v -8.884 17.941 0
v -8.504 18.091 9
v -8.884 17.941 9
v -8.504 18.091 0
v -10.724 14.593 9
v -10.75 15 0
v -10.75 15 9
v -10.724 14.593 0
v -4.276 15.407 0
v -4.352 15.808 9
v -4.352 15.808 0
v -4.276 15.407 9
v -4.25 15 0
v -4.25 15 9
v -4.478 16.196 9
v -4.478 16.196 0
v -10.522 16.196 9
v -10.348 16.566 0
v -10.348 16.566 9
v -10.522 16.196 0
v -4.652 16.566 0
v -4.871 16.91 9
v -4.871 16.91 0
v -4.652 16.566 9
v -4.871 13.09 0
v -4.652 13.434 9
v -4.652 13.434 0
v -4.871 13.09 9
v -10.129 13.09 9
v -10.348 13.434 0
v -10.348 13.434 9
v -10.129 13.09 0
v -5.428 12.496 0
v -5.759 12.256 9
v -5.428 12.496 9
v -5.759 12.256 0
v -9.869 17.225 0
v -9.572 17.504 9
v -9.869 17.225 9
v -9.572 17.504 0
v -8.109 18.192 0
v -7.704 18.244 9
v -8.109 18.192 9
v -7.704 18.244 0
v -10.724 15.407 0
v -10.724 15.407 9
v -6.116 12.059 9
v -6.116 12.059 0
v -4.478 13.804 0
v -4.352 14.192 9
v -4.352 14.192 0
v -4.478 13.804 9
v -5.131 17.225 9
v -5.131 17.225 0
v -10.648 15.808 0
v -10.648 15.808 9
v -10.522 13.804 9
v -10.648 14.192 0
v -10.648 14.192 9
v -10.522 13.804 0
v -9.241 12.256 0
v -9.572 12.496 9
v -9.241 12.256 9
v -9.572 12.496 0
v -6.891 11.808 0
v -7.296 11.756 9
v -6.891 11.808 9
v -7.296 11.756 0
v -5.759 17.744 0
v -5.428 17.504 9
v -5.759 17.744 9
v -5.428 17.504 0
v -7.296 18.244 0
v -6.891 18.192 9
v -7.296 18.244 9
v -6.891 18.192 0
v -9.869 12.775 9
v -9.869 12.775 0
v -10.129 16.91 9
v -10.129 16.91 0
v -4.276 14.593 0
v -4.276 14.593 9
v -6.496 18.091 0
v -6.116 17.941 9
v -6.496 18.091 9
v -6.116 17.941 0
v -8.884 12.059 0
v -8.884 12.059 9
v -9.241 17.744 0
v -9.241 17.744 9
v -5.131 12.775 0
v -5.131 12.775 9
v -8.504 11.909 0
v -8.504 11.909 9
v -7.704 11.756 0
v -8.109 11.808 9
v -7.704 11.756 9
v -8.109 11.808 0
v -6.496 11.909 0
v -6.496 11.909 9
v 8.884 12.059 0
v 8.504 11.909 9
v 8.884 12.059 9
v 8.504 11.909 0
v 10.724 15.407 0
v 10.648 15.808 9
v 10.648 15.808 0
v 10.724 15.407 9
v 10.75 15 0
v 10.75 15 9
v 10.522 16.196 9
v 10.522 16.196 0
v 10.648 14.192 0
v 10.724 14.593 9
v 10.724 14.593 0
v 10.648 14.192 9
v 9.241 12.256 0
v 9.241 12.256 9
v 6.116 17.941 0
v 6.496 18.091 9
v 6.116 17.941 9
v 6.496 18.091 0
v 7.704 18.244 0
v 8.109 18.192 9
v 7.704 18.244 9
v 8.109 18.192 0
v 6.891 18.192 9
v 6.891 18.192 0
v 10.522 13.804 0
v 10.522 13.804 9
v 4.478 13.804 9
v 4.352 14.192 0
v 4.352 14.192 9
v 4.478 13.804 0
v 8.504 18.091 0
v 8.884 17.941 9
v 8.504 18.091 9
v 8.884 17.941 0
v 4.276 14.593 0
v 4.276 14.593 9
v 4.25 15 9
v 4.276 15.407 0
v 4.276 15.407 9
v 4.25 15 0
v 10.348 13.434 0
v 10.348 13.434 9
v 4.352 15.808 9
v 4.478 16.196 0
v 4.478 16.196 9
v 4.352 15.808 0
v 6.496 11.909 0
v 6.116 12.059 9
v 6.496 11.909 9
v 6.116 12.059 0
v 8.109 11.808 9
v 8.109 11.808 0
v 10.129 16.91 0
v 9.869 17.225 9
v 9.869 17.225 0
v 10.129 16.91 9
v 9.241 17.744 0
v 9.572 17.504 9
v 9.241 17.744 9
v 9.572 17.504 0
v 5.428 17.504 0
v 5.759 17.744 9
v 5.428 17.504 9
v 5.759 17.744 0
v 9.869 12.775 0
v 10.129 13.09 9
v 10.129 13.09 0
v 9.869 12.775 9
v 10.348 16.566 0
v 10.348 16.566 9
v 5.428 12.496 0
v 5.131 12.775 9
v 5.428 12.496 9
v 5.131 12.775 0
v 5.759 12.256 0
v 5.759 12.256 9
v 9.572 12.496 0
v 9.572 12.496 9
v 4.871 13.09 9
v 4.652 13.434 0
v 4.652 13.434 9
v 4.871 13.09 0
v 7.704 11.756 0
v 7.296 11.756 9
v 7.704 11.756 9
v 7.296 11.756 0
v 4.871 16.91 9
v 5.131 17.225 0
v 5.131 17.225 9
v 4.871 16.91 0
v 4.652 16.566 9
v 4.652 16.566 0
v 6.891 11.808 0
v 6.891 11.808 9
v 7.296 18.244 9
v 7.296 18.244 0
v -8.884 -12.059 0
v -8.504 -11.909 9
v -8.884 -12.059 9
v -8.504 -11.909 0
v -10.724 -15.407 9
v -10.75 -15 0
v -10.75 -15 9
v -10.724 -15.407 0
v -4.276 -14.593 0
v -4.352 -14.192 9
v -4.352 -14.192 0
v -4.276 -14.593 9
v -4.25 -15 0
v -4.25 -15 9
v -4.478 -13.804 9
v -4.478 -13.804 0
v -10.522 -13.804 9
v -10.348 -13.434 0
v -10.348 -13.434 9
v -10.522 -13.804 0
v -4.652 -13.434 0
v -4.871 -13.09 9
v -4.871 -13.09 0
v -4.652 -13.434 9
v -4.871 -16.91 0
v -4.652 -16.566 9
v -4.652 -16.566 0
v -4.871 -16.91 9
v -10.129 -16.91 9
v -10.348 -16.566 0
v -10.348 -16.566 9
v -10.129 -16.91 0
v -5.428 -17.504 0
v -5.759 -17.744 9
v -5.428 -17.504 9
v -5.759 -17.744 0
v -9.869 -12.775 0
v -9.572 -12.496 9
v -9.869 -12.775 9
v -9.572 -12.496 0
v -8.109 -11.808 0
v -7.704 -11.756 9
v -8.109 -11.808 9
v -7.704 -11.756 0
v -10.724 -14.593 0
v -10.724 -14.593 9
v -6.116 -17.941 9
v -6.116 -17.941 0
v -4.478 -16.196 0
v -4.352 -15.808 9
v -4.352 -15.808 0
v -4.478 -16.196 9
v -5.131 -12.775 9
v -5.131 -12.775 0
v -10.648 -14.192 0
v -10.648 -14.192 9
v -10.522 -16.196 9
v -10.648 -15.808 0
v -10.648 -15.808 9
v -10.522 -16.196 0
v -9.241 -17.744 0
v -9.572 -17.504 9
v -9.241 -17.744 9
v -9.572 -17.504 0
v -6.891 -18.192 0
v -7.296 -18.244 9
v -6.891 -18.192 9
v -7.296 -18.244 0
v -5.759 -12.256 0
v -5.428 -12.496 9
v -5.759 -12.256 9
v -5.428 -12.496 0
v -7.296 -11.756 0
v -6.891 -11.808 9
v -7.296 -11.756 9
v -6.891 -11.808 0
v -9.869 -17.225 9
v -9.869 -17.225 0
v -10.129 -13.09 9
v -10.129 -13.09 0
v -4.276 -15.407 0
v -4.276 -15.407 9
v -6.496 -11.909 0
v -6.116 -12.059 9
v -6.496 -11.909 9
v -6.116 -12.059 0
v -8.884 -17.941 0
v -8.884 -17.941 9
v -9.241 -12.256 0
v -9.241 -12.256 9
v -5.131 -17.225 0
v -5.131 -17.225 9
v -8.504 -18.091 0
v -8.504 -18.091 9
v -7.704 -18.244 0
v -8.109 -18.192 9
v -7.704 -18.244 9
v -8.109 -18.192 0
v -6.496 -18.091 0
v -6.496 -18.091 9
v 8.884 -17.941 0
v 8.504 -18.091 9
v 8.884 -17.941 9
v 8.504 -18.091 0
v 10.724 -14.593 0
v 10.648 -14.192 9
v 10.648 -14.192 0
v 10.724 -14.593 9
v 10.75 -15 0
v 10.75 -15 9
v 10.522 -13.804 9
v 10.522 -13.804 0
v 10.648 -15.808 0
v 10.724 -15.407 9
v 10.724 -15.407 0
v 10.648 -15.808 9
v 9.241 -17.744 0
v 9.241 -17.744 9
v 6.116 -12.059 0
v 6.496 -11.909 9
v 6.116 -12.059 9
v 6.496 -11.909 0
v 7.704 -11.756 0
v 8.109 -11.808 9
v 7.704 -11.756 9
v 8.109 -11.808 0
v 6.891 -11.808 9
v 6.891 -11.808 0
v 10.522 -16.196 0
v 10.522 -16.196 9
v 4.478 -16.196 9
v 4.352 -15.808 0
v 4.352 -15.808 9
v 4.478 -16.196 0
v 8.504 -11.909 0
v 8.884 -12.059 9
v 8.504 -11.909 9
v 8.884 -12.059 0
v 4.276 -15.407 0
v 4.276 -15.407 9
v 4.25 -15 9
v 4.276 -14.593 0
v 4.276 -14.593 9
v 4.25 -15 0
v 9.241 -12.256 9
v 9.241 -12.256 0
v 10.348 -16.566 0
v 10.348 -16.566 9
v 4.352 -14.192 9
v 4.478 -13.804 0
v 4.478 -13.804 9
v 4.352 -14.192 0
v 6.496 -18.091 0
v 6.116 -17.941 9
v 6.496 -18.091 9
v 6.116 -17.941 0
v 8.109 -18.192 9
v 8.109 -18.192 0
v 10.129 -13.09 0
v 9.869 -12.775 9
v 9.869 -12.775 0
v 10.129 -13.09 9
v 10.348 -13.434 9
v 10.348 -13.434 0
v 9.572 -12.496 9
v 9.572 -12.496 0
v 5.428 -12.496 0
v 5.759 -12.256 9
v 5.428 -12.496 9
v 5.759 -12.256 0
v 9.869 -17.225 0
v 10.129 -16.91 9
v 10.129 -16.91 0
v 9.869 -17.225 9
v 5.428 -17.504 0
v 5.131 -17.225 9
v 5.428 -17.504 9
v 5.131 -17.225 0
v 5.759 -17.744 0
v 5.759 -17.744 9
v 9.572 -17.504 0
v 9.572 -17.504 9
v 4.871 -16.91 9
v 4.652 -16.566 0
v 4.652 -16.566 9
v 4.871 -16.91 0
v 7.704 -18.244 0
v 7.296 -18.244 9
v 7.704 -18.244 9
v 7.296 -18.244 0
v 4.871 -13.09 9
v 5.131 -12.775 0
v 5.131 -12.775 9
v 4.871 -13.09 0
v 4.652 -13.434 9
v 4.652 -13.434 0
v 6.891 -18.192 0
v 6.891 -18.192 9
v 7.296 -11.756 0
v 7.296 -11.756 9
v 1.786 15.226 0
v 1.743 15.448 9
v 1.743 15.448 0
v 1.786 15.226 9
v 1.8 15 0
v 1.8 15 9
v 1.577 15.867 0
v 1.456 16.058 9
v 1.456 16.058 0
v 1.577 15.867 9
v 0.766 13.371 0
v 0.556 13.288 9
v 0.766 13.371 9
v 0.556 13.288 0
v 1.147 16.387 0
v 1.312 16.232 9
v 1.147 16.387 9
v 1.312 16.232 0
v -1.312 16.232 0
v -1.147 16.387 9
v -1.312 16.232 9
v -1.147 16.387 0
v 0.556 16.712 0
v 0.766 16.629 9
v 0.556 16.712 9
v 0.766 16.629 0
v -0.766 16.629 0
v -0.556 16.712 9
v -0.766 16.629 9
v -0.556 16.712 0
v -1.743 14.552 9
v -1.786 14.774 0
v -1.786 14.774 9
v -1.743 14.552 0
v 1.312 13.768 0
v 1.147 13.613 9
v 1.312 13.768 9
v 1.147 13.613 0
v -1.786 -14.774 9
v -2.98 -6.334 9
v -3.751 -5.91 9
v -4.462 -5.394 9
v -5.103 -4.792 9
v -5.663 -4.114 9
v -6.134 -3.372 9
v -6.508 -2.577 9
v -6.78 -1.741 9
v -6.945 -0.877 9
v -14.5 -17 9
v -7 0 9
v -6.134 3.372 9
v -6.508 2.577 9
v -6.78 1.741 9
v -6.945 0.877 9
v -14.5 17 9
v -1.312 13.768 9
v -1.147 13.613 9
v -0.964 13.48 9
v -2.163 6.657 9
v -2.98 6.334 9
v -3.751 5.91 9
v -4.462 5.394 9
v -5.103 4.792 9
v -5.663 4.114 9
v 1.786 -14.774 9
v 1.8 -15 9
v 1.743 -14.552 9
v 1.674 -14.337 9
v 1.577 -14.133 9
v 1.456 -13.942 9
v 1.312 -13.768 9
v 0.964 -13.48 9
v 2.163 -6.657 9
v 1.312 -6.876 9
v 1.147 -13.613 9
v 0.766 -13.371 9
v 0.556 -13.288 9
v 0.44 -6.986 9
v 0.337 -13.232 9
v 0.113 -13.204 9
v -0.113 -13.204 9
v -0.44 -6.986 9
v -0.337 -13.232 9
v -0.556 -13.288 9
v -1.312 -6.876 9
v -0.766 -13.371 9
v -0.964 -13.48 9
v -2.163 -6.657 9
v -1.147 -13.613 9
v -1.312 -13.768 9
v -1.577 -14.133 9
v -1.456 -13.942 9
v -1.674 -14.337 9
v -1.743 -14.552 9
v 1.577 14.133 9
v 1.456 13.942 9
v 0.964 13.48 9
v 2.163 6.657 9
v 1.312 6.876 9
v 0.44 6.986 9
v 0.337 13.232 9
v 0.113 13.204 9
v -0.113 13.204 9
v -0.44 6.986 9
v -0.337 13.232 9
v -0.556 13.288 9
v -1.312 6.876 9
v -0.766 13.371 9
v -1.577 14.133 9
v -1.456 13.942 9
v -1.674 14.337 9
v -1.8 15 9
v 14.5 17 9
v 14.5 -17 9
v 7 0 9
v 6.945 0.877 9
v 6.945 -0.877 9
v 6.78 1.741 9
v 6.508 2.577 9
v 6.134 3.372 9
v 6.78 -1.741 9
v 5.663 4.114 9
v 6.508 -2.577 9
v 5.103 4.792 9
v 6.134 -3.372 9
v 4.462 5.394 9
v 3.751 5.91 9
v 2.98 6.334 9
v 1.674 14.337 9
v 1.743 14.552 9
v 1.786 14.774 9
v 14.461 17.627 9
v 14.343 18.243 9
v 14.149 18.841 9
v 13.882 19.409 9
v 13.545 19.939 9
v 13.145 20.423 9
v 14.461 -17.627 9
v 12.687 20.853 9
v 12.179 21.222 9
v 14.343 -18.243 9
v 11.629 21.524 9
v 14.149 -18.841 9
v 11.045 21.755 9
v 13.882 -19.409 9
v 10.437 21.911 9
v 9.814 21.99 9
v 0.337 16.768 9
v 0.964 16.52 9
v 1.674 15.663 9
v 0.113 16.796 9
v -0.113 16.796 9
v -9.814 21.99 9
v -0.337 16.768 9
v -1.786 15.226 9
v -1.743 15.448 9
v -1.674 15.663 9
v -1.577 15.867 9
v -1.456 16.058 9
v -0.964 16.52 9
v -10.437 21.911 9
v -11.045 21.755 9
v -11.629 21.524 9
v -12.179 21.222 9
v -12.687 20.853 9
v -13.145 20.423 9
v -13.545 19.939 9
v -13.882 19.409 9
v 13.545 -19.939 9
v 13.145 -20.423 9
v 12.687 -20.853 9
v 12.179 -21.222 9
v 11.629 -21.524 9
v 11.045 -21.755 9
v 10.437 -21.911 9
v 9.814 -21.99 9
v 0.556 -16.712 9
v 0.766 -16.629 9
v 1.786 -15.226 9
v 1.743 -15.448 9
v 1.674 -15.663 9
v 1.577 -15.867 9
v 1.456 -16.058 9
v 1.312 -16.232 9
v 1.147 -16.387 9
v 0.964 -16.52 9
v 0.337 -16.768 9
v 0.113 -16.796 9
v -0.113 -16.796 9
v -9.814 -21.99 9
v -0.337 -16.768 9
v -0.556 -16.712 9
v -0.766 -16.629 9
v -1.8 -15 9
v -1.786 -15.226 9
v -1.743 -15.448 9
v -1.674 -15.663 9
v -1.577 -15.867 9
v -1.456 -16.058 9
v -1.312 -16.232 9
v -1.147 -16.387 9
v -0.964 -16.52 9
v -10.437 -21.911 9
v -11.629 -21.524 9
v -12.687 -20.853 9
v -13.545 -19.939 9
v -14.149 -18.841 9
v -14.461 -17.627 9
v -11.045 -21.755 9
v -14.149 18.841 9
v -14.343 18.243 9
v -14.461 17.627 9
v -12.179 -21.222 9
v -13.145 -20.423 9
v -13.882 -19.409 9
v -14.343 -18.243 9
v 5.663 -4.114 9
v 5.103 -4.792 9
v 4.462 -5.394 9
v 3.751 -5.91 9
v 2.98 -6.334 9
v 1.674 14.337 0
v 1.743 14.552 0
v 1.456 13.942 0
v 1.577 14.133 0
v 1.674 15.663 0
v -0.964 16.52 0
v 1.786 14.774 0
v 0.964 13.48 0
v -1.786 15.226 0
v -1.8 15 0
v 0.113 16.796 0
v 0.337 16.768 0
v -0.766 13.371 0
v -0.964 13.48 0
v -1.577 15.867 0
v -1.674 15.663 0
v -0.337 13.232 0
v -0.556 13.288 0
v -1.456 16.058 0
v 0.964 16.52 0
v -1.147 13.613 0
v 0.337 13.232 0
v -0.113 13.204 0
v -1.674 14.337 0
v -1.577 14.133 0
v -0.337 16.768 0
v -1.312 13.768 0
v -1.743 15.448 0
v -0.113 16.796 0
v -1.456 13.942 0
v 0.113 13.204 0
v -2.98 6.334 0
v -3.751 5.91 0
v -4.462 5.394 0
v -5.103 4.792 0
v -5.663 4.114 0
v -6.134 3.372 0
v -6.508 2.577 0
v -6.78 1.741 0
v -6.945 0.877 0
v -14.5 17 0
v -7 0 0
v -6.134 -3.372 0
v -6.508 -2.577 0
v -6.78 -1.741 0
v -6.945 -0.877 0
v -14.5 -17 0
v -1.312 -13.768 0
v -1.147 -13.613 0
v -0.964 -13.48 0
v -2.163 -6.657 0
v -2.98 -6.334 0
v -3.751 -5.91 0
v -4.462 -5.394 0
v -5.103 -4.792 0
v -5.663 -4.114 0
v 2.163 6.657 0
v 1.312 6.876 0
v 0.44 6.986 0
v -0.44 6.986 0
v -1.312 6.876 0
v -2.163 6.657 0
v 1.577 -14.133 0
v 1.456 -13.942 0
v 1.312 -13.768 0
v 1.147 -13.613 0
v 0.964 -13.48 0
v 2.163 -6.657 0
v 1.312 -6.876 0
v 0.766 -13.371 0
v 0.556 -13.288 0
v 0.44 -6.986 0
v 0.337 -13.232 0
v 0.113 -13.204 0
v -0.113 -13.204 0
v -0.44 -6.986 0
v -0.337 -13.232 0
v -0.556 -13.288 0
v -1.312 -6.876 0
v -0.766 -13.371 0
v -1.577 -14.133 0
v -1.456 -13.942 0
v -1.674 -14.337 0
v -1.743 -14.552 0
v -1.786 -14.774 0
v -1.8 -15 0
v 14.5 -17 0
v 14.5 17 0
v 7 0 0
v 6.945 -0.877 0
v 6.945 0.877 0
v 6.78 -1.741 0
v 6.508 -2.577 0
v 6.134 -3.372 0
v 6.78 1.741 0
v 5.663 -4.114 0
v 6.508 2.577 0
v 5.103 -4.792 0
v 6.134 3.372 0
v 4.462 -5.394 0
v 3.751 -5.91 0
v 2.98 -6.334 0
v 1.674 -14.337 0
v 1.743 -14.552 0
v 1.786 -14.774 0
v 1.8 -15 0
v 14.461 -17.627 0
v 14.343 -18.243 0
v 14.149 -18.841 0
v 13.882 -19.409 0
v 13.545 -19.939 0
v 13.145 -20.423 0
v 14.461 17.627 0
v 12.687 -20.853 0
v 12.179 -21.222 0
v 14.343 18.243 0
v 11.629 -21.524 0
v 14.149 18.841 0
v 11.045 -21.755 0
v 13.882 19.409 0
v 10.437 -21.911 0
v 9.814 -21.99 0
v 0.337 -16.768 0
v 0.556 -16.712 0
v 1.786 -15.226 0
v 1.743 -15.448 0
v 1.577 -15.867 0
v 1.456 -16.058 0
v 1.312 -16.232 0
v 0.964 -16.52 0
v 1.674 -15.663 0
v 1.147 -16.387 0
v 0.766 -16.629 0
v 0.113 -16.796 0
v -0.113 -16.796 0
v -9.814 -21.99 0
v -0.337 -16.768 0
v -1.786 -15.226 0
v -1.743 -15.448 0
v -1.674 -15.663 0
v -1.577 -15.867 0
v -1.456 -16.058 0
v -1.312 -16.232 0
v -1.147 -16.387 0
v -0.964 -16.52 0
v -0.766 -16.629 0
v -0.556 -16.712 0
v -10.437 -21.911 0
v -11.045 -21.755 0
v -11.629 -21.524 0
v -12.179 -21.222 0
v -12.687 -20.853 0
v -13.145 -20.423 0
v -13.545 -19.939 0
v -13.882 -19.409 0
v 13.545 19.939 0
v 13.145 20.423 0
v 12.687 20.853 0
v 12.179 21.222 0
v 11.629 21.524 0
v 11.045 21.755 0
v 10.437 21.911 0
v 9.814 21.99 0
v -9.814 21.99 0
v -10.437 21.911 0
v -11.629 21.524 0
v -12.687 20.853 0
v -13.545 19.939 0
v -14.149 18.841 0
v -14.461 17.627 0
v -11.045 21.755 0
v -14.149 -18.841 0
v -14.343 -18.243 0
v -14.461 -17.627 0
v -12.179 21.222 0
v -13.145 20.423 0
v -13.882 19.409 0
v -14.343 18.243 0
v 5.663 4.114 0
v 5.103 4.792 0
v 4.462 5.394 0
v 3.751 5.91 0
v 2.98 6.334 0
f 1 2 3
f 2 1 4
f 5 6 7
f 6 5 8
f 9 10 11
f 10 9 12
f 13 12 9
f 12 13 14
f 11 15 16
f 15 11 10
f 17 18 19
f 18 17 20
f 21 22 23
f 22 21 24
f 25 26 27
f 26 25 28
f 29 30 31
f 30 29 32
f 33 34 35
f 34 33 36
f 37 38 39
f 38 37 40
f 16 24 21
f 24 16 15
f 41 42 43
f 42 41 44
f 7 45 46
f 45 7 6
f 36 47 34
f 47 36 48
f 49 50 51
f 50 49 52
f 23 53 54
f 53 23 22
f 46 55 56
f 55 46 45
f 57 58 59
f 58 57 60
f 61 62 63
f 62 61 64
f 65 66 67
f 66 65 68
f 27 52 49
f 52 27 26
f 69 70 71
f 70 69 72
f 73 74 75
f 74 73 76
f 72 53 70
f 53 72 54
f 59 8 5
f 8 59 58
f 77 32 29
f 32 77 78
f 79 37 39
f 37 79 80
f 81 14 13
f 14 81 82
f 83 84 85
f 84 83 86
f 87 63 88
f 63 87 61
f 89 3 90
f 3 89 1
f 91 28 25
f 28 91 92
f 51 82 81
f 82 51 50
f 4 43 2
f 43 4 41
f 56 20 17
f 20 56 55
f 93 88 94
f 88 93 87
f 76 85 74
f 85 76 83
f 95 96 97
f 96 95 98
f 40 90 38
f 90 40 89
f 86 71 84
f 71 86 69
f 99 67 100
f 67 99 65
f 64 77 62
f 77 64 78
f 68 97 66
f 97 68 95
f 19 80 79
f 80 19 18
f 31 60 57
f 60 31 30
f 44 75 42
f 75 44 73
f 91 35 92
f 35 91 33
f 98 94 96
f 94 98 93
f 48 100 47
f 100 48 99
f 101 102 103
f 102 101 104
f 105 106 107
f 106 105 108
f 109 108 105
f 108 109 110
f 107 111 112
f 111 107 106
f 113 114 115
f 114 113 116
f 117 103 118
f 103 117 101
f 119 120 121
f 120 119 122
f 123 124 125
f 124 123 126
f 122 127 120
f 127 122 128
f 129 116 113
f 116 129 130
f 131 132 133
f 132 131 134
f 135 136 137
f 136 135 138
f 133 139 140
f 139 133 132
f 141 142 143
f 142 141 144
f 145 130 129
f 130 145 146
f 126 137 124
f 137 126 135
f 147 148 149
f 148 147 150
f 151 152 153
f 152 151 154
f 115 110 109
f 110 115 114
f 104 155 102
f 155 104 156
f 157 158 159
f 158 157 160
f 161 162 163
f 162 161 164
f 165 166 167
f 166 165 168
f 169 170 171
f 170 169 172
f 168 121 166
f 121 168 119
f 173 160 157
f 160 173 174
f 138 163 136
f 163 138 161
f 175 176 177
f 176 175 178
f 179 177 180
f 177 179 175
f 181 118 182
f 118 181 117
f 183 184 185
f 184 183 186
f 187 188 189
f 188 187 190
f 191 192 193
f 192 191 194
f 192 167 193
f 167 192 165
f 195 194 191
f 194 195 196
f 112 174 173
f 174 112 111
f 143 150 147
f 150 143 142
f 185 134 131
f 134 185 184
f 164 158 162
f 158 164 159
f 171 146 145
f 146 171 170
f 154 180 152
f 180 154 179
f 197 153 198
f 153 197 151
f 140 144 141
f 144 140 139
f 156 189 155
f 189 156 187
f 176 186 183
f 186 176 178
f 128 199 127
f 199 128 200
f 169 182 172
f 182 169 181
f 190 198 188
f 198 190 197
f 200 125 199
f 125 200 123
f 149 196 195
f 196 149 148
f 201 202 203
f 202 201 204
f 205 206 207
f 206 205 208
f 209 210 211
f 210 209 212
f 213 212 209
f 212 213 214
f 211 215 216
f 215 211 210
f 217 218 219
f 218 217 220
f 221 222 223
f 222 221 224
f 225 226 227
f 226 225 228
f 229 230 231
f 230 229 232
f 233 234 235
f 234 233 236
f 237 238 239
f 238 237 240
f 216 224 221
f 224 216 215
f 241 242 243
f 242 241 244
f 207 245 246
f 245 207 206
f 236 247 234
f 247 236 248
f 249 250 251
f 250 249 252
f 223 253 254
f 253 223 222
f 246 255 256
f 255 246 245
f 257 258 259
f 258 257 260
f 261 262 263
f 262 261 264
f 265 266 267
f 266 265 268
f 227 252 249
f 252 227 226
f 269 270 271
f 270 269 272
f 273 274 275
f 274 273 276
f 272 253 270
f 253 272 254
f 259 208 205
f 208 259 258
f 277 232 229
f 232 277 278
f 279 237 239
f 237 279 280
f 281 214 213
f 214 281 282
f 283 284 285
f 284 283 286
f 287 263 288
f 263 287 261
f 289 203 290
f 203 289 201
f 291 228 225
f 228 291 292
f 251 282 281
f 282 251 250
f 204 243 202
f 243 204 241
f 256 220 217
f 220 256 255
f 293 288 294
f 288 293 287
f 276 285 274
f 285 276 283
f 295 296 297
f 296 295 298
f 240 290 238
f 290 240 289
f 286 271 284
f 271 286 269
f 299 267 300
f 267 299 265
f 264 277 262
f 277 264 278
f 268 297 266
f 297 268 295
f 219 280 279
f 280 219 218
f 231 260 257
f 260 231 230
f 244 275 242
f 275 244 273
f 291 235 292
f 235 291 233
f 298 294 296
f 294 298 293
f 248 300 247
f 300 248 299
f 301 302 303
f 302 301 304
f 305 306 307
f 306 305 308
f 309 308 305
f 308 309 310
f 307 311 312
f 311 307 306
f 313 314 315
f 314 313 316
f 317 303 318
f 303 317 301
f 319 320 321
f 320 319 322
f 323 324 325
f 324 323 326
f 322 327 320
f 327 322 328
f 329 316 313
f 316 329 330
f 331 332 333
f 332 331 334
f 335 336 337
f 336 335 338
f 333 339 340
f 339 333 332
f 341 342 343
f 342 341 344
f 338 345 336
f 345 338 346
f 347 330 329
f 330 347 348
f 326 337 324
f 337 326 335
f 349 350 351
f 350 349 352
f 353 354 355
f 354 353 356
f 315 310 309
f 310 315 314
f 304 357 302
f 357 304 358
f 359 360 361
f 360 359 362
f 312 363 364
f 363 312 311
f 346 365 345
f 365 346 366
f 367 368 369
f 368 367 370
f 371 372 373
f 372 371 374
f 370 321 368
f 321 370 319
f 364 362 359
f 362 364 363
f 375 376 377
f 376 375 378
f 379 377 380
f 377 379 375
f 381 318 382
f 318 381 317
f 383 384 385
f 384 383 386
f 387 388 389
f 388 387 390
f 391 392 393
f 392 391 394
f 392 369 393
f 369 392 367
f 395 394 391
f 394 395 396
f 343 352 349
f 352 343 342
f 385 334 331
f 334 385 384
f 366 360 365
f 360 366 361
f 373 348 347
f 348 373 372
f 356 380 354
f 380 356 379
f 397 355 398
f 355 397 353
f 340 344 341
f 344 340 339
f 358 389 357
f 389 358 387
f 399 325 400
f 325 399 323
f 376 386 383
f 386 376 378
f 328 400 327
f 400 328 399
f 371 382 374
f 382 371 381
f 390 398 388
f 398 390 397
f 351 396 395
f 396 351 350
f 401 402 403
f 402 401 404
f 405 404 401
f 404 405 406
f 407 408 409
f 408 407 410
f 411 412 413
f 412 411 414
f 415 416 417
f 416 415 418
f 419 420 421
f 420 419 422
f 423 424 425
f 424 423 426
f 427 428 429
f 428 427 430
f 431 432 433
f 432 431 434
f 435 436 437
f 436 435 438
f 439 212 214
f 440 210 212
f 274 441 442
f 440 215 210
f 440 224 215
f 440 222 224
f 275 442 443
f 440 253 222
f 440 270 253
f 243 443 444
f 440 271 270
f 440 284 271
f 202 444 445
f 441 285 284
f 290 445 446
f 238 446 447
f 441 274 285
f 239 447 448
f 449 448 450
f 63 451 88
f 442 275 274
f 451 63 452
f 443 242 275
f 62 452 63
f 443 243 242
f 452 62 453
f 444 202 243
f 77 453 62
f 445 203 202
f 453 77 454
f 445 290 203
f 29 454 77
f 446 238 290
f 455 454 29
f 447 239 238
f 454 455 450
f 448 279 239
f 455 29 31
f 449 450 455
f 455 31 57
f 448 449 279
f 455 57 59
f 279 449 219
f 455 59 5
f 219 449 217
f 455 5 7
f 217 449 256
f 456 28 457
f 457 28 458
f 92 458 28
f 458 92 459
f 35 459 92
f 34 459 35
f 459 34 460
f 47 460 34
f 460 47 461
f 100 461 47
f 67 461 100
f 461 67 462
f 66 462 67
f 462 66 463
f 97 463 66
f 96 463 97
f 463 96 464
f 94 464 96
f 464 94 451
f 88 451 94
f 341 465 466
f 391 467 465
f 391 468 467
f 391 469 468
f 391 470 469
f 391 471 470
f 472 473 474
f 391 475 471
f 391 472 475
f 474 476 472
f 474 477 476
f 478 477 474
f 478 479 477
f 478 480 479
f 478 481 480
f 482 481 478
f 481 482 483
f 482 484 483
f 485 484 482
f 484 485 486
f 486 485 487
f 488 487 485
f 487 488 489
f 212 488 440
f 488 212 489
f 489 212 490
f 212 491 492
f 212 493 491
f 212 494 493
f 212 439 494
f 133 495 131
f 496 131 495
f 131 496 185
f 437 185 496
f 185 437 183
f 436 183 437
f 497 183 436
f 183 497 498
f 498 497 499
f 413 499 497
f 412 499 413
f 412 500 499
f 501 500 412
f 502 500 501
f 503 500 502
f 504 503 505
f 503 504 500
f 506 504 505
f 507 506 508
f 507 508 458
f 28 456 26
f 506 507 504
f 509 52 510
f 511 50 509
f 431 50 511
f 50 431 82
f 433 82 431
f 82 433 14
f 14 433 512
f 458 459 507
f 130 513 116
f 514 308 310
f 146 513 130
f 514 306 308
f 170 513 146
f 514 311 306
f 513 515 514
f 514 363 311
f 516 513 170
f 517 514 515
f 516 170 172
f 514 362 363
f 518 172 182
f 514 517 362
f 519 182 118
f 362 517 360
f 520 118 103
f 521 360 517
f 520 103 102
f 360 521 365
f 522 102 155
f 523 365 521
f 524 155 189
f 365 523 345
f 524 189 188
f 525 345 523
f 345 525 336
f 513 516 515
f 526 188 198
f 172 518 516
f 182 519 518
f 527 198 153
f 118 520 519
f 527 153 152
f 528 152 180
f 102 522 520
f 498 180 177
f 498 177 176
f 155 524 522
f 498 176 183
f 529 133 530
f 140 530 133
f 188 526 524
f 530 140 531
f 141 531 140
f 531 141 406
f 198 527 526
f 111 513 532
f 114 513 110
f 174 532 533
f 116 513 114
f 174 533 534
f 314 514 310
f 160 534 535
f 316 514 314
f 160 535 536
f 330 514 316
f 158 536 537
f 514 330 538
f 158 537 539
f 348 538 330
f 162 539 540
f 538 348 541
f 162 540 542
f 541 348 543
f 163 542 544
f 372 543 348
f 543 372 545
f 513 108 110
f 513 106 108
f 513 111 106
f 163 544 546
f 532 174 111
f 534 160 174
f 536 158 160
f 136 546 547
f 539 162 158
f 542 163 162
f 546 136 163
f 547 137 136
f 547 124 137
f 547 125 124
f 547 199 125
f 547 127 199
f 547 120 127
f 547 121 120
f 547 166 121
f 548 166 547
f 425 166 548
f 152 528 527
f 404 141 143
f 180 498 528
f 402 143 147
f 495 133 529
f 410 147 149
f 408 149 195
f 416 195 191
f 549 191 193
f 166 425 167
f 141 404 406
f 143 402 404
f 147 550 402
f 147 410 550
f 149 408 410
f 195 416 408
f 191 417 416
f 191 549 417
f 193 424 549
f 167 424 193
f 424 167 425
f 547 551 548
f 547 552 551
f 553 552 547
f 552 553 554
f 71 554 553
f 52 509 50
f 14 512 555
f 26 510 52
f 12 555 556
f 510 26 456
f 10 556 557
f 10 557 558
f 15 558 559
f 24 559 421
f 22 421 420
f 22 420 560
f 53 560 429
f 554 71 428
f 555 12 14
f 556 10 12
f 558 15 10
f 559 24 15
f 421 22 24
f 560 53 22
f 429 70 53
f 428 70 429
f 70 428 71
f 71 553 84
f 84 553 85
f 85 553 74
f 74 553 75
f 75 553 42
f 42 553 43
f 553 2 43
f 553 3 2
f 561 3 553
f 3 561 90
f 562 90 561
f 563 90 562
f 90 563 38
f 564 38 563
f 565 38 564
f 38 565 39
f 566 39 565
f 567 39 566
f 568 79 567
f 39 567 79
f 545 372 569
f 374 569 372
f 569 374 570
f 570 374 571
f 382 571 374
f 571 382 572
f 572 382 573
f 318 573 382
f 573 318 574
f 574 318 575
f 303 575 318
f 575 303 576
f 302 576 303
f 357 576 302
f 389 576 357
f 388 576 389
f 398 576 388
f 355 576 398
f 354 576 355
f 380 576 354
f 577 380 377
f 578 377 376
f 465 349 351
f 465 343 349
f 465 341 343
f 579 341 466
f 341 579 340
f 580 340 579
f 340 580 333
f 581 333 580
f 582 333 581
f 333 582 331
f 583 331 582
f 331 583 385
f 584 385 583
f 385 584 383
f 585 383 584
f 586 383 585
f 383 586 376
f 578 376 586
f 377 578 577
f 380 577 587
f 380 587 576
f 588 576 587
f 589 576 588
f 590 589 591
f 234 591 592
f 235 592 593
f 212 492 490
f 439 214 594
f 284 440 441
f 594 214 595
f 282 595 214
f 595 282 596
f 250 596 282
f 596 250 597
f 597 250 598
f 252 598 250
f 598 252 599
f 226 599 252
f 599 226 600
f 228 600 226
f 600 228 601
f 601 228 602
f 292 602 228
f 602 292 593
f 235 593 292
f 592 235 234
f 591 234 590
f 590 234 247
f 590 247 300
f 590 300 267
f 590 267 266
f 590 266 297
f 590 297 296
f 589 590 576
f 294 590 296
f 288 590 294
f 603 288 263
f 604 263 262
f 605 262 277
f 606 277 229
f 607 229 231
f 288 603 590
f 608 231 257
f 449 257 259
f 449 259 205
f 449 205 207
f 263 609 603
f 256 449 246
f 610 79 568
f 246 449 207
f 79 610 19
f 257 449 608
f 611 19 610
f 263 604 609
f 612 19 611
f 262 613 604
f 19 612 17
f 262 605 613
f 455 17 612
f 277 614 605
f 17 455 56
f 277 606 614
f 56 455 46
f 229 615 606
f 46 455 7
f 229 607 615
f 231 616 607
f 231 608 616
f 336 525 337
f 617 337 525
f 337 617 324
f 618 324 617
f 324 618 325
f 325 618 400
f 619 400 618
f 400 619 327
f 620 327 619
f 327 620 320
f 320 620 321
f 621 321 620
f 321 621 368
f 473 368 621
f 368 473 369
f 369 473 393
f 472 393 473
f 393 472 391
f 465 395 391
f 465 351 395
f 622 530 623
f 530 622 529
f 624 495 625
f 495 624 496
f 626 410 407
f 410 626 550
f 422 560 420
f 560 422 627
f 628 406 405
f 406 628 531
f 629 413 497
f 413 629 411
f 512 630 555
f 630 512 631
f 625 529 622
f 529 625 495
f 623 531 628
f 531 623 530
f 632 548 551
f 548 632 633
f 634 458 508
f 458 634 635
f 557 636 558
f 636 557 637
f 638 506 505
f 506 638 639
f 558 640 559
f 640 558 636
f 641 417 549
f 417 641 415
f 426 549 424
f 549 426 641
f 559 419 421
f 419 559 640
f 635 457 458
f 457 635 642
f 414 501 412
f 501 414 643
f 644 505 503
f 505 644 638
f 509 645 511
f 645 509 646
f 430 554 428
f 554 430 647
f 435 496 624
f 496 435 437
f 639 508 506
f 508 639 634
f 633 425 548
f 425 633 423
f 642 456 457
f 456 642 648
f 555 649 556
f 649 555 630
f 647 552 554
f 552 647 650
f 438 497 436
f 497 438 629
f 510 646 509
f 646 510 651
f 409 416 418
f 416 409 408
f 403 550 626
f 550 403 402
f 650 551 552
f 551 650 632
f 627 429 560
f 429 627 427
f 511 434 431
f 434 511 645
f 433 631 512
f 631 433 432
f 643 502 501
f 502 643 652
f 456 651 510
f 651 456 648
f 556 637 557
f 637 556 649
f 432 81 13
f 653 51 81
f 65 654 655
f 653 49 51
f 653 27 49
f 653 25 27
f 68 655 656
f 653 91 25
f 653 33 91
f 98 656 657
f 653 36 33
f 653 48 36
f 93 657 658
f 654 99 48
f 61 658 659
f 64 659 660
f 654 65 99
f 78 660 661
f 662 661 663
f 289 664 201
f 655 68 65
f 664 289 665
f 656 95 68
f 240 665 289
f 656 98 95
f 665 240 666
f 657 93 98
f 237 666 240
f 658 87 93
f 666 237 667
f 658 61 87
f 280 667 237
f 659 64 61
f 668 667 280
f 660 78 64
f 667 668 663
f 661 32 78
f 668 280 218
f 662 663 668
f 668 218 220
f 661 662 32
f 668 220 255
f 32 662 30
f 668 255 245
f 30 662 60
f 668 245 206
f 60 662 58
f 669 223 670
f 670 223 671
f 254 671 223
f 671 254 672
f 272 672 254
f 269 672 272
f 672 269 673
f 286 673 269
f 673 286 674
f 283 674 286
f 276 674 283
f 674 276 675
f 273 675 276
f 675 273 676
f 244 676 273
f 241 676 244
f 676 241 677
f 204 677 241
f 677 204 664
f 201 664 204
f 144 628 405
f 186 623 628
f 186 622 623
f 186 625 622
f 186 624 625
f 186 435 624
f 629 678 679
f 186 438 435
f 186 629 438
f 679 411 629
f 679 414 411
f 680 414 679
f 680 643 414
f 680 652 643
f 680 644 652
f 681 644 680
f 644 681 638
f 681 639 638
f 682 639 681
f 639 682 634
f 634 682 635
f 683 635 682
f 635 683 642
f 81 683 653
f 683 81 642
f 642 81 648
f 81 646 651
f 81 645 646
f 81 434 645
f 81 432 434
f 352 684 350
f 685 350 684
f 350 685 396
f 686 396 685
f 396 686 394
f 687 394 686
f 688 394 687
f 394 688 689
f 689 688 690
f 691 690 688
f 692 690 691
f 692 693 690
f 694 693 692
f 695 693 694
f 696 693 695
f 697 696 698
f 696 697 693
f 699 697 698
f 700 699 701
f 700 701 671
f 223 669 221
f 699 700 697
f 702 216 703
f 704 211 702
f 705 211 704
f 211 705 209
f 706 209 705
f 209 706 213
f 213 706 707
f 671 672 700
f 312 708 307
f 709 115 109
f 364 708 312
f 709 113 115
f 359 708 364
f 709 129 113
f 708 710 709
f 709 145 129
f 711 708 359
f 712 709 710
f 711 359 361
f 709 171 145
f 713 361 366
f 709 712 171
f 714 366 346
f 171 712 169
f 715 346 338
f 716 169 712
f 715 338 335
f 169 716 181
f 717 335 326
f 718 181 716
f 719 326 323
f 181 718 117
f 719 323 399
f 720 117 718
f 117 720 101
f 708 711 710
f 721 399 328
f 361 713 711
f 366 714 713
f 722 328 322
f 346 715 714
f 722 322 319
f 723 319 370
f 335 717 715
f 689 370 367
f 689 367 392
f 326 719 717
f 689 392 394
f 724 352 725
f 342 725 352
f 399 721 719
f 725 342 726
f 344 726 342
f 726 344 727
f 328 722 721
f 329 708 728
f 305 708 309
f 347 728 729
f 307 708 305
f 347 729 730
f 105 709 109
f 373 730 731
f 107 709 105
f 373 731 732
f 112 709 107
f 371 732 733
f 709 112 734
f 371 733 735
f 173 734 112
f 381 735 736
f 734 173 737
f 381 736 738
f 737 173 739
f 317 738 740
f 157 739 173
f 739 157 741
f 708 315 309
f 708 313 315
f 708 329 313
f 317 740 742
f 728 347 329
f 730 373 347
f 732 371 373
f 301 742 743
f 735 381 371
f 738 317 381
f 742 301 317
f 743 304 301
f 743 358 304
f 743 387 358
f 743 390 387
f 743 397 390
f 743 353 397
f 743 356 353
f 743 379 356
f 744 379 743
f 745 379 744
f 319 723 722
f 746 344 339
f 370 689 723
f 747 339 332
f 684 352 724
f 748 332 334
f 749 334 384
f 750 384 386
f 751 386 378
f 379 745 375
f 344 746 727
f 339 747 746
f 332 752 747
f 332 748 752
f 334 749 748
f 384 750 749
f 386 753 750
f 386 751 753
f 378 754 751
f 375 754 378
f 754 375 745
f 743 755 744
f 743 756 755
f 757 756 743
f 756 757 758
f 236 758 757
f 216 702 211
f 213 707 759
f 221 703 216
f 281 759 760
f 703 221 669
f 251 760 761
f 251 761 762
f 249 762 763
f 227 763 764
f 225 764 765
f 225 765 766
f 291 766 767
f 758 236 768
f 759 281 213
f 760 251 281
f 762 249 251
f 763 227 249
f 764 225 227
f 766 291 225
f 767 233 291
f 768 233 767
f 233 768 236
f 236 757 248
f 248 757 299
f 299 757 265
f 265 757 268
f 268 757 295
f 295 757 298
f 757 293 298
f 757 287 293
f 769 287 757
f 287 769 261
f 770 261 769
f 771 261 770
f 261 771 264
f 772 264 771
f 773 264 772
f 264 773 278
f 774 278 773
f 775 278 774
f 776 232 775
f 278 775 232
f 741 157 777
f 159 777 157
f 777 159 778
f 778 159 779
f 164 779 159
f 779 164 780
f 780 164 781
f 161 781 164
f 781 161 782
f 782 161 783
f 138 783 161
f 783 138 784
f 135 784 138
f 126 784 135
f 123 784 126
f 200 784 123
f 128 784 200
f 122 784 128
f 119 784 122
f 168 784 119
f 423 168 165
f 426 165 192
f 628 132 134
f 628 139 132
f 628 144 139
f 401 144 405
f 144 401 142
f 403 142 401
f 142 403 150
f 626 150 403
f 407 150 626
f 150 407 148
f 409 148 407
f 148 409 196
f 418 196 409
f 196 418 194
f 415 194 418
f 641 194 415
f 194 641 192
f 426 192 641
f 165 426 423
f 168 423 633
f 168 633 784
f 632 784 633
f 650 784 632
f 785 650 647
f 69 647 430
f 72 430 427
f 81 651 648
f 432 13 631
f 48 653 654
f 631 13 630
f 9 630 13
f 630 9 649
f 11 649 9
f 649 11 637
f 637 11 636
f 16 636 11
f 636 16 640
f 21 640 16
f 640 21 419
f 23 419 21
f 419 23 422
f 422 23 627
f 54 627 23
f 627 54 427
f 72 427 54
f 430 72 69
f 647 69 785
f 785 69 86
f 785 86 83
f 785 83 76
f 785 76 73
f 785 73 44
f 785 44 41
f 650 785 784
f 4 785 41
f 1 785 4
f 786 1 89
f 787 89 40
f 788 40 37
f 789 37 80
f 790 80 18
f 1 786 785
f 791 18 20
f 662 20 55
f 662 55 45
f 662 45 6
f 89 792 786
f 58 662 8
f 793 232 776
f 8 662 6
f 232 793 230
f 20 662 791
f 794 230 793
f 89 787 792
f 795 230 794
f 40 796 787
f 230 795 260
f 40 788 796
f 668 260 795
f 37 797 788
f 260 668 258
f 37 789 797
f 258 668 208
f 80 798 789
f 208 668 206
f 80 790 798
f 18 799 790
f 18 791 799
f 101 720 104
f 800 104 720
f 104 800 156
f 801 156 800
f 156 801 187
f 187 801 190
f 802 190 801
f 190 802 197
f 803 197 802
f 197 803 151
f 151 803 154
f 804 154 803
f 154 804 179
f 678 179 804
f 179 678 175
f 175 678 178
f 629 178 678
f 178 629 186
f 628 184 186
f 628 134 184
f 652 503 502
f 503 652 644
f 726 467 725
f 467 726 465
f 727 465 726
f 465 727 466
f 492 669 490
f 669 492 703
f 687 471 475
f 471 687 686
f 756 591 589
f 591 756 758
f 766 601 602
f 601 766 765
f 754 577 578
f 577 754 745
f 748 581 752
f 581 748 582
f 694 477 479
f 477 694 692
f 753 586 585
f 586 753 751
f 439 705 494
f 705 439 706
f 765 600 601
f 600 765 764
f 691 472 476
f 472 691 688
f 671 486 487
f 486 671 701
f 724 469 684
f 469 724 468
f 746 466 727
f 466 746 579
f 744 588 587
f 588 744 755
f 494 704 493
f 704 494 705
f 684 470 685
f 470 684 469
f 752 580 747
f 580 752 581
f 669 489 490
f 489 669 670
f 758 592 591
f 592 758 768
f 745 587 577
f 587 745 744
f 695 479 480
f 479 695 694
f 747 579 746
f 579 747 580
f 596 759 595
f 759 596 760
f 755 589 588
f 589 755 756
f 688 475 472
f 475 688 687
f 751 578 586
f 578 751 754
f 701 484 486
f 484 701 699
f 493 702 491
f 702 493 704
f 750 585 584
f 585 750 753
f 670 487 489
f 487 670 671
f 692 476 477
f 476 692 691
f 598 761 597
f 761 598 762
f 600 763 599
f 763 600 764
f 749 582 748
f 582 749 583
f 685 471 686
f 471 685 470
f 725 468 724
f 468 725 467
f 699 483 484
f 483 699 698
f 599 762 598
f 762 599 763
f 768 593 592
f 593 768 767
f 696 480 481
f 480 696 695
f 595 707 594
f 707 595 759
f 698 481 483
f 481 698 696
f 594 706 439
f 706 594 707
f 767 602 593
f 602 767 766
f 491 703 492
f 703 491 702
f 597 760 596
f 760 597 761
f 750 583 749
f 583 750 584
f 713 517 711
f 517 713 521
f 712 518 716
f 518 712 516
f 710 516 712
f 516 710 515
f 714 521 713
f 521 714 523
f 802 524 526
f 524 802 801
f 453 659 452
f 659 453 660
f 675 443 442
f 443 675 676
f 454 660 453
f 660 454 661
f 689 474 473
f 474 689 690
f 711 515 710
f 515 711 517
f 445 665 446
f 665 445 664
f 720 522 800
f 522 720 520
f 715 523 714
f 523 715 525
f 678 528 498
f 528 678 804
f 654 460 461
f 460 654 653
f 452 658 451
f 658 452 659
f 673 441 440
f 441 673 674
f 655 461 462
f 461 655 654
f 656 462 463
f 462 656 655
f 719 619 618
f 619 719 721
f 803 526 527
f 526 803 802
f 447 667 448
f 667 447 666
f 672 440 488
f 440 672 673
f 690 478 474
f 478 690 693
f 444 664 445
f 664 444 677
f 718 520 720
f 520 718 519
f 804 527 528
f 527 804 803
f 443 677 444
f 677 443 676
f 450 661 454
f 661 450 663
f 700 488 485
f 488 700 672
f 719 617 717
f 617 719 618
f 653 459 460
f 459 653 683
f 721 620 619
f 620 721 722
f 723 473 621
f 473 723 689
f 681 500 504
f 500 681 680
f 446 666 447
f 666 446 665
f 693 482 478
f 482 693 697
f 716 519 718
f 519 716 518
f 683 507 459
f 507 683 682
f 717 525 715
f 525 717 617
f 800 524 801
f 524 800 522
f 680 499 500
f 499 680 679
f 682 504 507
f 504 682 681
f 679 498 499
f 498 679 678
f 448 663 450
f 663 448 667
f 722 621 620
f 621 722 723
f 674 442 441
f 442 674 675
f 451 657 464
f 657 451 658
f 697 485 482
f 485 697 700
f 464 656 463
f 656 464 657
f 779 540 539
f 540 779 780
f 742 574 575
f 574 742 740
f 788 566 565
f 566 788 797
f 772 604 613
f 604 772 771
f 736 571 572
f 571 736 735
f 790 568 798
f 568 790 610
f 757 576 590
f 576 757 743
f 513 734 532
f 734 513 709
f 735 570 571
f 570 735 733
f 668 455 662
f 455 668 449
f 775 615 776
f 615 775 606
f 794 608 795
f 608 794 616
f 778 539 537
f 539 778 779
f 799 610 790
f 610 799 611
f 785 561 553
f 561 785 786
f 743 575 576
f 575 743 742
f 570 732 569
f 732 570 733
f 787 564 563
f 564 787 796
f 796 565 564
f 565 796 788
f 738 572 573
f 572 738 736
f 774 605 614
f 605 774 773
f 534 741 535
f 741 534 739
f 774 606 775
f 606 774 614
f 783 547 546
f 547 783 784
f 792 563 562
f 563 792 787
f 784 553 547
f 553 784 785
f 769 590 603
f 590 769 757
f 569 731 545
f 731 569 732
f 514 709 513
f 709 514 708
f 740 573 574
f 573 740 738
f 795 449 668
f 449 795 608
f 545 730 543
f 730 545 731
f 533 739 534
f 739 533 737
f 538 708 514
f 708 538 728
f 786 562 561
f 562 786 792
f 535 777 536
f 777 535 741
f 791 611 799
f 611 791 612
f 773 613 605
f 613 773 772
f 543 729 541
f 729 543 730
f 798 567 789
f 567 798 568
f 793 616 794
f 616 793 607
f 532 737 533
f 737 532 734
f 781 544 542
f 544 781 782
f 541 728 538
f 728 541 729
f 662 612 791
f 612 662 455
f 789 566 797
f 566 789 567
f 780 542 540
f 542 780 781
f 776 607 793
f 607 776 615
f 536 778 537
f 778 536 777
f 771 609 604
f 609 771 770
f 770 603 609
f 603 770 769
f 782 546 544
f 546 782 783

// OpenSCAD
$fn = 50;


difference() {
	union() {
		hull() {
			translate(v = [-9.5000000000, 17.0000000000, 0]) {
				cylinder(h = 9, r = 5);
			}
			translate(v = [9.5000000000, 17.0000000000, 0]) {
				cylinder(h = 9, r = 5);
			}
			translate(v = [-9.5000000000, -17.0000000000, 0]) {
				cylinder(h = 9, r = 5);
			}
			translate(v = [9.5000000000, -17.0000000000, 0]) {
				cylinder(h = 9, r = 5);
			}
		}
	}
	union() {
		#translate(v = [-7.5000000000, 15.0000000000, 0]) {
			cylinder(h = 9, r = 3.2500000000);
		}
		#translate(v = [7.5000000000, 15.0000000000, 0]) {
			cylinder(h = 9, r = 3.2500000000);
		}
		#translate(v = [-7.5000000000, -15.0000000000, 0]) {
			cylinder(h = 9, r = 3.2500000000);
		}
		#translate(v = [7.5000000000, -15.0000000000, 0]) {
			cylinder(h = 9, r = 3.2500000000);
		}
		#translate(v = [-7.5000000000, -15.0000000000, -100.0000000000]) {
			cylinder(h = 200, r = 3.2500000000);
		}
		#translate(v = [-7.5000000000, 15.0000000000, -100.0000000000]) {
			cylinder(h = 200, r = 3.2500000000);
		}
		#translate(v = [7.5000000000, -15.0000000000, -100.0000000000]) {
			cylinder(h = 200, r = 3.2500000000);
		}
		#translate(v = [7.5000000000, 15.0000000000, -100.0000000000]) {
			cylinder(h = 200, r = 3.2500000000);
		}
		#translate(v = [-7.5000000000, 15.0000000000, 0]) {
			cylinder(h = 9, r = 1.8000000000);
		}
		#translate(v = [0.0000000000, 15.0000000000, 0]) {
			cylinder(h = 9, r = 1.8000000000);
		}
		#translate(v = [7.5000000000, 15.0000000000, 0]) {
			cylinder(h = 9, r = 1.8000000000);
		}
		#translate(v = [-7.5000000000, -15.0000000000, 0]) {
			cylinder(h = 9, r = 1.8000000000);
		}
		#translate(v = [0.0000000000, -15.0000000000, 0]) {
			cylinder(h = 9, r = 1.8000000000);
		}
		#translate(v = [7.5000000000, -15.0000000000, 0]) {
			cylinder(h = 9, r = 1.8000000000);
		}
		#translate(v = [-7.5000000000, 15.0000000000, 0]) {
			cylinder(h = 9, r = 1.8000000000);
		}
		#translate(v = [0.0000000000, 15.0000000000, 0]) {
			cylinder(h = 9, r = 1.8000000000);
		}
		#translate(v = [7.5000000000, 15.0000000000, 0]) {
			cylinder(h = 9, r = 1.8000000000);
		}
		#translate(v = [-7.5000000000, -15.0000000000, 0]) {
			cylinder(h = 9, r = 1.8000000000);
		}
		#translate(v = [0.0000000000, -15.0000000000, 0]) {
			cylinder(h = 9, r = 1.8000000000);
		}
		#translate(v = [7.5000000000, -15.0000000000, 0]) {
			cylinder(h = 9, r = 1.8000000000);
		}
		#translate(v = [-7.5000000000, 15.0000000000, 0]) {
			cylinder(h = 9, r = 1.8000000000);
		}
		#translate(v = [0.0000000000, 15.0000000000, 0]) {
			cylinder(h = 9, r = 1.8000000000);
		}
		#translate(v = [7.5000000000, 15.0000000000, 0]) {
			cylinder(h = 9, r = 1.8000000000);
		}
		#translate(v = [-7.5000000000, -15.0000000000, 0]) {
			cylinder(h = 9, r = 1.8000000000);
		}
		#translate(v = [0.0000000000, -15.0000000000, 0]) {
			cylinder(h = 9, r = 1.8000000000);
		}
		#translate(v = [7.5000000000, -15.0000000000, 0]) {
			cylinder(h = 9, r = 1.8000000000);
		}
		#cylinder(h = 9, r = 7.0000000000);
	}
}
